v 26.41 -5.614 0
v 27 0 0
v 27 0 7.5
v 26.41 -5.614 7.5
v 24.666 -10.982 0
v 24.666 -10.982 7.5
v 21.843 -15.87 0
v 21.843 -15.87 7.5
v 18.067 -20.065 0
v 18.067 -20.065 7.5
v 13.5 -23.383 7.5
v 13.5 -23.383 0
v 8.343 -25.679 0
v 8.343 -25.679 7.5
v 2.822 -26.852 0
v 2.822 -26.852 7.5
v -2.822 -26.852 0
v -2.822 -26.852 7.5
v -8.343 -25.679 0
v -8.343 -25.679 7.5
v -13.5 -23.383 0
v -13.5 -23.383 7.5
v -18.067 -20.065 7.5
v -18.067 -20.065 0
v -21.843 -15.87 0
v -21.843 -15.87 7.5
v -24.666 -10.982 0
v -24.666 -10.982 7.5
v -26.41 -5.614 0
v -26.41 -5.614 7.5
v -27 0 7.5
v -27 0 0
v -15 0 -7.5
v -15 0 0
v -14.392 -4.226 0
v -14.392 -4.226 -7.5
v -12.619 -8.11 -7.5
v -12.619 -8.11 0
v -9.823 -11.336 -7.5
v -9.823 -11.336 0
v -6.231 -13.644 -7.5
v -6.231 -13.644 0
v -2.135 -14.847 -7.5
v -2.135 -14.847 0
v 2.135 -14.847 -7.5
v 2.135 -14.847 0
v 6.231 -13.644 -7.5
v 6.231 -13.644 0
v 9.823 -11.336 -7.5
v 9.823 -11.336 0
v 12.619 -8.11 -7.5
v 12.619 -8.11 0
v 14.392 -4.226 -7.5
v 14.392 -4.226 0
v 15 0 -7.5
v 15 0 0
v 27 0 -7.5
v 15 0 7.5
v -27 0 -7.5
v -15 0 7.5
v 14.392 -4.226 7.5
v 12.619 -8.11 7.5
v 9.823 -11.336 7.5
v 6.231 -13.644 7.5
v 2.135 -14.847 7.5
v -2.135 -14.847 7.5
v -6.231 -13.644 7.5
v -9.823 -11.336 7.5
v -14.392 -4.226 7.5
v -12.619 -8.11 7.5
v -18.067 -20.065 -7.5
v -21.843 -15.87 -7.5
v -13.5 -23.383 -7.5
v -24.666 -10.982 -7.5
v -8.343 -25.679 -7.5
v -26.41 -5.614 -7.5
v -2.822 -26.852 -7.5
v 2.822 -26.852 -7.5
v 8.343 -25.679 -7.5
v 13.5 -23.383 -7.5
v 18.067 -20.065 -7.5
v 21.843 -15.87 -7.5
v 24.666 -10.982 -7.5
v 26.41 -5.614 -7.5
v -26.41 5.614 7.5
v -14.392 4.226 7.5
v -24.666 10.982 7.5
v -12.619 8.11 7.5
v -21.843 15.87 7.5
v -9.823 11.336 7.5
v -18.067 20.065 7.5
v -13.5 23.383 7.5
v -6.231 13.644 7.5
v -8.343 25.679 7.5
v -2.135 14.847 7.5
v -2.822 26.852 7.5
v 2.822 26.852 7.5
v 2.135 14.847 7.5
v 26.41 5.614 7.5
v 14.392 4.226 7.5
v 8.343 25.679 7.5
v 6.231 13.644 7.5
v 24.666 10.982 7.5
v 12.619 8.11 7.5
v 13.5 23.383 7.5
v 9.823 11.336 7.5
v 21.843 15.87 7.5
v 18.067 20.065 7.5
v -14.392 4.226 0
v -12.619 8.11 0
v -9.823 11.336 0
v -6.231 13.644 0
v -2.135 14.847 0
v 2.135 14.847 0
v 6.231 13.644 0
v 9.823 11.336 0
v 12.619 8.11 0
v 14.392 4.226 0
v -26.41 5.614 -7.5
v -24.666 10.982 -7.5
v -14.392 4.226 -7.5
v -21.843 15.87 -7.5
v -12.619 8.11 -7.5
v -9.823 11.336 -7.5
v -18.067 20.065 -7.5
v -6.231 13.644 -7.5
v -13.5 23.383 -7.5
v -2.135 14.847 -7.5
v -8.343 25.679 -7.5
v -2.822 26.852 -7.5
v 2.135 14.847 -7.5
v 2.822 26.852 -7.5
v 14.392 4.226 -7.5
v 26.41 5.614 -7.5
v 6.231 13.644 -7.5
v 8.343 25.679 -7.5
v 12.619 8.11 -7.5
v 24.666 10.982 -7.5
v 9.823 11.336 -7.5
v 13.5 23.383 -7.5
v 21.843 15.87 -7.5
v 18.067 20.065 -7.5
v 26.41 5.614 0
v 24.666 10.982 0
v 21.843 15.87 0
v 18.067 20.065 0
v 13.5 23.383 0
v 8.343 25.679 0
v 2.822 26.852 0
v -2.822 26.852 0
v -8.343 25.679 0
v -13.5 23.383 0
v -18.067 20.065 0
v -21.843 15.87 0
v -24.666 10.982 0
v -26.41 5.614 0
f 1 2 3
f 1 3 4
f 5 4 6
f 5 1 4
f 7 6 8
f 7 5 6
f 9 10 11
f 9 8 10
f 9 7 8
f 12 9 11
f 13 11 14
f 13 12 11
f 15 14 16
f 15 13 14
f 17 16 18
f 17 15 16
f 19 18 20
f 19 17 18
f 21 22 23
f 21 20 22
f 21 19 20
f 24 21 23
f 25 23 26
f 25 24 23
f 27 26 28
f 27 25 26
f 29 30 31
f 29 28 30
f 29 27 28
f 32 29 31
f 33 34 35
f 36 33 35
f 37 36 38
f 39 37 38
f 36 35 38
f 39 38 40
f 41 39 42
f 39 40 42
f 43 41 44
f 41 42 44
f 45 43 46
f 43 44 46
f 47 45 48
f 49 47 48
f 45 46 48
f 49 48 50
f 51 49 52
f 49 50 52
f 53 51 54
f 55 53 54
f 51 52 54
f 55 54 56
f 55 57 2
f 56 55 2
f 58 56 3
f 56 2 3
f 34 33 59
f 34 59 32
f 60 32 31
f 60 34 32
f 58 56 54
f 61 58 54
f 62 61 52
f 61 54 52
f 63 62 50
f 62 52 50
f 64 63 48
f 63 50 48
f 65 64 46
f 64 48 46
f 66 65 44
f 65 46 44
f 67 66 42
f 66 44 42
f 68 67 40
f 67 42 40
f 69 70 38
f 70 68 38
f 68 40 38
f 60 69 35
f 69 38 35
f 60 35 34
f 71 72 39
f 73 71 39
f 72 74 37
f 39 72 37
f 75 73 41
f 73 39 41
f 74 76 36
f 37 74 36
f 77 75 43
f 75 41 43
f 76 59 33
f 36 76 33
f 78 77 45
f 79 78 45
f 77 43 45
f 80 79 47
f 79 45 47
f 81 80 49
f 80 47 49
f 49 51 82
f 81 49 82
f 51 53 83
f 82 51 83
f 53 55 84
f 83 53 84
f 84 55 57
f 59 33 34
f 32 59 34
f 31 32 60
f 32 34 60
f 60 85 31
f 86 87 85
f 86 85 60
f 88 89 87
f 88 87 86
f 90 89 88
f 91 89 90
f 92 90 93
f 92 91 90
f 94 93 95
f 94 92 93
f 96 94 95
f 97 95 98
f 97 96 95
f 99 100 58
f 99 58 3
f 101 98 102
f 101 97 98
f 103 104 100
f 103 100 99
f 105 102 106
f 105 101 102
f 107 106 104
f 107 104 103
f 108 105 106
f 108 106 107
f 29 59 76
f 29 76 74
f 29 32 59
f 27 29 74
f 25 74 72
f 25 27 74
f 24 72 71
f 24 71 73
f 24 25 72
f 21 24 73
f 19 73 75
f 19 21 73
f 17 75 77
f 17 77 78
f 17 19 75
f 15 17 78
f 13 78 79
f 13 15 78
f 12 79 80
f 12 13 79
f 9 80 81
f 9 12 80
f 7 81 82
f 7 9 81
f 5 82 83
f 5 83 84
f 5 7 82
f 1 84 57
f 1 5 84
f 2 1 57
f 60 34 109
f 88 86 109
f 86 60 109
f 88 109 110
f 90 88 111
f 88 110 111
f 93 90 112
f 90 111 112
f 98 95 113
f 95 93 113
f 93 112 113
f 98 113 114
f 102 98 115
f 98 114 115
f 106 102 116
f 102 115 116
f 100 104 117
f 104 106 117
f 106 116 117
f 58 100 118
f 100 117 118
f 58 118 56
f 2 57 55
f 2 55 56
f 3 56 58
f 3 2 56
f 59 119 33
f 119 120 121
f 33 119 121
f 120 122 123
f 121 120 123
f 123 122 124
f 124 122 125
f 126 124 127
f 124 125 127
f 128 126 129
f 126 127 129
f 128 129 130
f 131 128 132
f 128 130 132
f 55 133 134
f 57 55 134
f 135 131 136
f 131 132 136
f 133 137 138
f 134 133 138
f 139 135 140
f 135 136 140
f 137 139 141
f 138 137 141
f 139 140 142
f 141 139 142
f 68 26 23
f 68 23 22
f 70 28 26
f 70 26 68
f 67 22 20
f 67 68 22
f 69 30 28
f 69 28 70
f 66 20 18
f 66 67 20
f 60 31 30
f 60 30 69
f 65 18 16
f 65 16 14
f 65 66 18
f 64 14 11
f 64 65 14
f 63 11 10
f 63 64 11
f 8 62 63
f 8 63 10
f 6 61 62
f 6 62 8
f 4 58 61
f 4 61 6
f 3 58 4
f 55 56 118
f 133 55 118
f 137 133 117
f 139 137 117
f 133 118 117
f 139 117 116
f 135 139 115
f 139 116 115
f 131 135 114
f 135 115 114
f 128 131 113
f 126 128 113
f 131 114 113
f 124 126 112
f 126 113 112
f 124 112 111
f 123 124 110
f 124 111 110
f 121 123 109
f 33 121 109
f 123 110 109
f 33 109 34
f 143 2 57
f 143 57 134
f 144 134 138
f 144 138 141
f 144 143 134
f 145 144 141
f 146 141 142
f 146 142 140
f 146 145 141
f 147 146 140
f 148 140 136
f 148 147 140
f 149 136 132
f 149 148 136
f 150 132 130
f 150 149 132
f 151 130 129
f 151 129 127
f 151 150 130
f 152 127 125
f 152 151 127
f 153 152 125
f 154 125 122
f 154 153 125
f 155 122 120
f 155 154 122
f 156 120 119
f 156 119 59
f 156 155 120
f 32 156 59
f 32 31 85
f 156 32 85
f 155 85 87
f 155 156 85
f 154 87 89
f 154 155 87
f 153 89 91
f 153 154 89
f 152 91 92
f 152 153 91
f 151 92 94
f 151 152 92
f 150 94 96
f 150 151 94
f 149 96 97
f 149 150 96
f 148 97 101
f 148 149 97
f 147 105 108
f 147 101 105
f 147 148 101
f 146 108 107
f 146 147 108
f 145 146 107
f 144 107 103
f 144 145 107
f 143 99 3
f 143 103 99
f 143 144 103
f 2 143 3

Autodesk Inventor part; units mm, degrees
ref_plane "YZ Plane" through (0, 0, 0) normal (1, 0, 0) x (0, 1, 0)
ref_plane "XY Plane" through (0, 0, 0) normal (0, 0, 1) x (1, 0, 0)
sketch "Two Piece Clamp Profile" plane through (0, 0, 0) normal (0, 0, 1) x (1, 0, 0)
  circle A0 centre (0, 0) radius 15
  circle A1 centre (0, 0) radius 27
  dimension "d0" = 54
  dimension "d1" = 30
extrude "Make Part" add sketch "Two Piece Clamp Profile" along normal mid plane 15
split body "Two Parts" result two bodies by plane through (0, 0, 0) normal (0, 1, 0) first body at (-22.7385, 2.1538, 7)
ref_plane "Tangent Plane" through (0, 27, 0) normal (0, 1, 0) x (-1, 0, 0)
sketch "Locate Hole Centres" plane through (0, 27, 0) normal (0, 1, 0) x (-1, 0, 0)
  line L0 (-15, -7.5) -> (-27, -7.5) projected
  line L1 (-15, 7.5) -> (-15, -7.5) projected
  line L2 (-27, 7.5) -> (-15, 7.5) projected
  line L3 (-27, -7.5) -> (-27, 7.5) projected
  line L4 (27, -7.5) -> (15, -7.5) projected
  line L5 (27, 7.5) -> (27, -7.5) projected
  line L6 (15, 7.5) -> (27, 7.5) projected
  line L7 (15, -7.5) -> (15, 7.5) projected
  line L8 (-21, 7.5) -> (-21, -7.5) construction
  line L9 (21, 7.5) -> (21, -7.5) construction
  point P0 (0, 0)
  point P1 (-21, 0)
  point P2 (21, 0)
equation "\"d0\" = Huco30_54_15_TwoPieceClampOuterDiameter"
equation "\"d1\" = Huco30_54_15_TwoPieceClampBore"
equation "\"d2\" = Huco30_54_15_TwoPieceClampWidth"
equation "\"Huco30_54_15_TwoPieceClampWidth\" = 15"
equation "\"Huco30_54_15_TwoPieceClampBore\" = 30"
equation "\"Huco30_54_15_TwoPieceClampOuterDiameter\" = 54"
properties part number "Two Piece Clamp Huco Stock No 046201030 Dim 30-54-15" material "Steel"
